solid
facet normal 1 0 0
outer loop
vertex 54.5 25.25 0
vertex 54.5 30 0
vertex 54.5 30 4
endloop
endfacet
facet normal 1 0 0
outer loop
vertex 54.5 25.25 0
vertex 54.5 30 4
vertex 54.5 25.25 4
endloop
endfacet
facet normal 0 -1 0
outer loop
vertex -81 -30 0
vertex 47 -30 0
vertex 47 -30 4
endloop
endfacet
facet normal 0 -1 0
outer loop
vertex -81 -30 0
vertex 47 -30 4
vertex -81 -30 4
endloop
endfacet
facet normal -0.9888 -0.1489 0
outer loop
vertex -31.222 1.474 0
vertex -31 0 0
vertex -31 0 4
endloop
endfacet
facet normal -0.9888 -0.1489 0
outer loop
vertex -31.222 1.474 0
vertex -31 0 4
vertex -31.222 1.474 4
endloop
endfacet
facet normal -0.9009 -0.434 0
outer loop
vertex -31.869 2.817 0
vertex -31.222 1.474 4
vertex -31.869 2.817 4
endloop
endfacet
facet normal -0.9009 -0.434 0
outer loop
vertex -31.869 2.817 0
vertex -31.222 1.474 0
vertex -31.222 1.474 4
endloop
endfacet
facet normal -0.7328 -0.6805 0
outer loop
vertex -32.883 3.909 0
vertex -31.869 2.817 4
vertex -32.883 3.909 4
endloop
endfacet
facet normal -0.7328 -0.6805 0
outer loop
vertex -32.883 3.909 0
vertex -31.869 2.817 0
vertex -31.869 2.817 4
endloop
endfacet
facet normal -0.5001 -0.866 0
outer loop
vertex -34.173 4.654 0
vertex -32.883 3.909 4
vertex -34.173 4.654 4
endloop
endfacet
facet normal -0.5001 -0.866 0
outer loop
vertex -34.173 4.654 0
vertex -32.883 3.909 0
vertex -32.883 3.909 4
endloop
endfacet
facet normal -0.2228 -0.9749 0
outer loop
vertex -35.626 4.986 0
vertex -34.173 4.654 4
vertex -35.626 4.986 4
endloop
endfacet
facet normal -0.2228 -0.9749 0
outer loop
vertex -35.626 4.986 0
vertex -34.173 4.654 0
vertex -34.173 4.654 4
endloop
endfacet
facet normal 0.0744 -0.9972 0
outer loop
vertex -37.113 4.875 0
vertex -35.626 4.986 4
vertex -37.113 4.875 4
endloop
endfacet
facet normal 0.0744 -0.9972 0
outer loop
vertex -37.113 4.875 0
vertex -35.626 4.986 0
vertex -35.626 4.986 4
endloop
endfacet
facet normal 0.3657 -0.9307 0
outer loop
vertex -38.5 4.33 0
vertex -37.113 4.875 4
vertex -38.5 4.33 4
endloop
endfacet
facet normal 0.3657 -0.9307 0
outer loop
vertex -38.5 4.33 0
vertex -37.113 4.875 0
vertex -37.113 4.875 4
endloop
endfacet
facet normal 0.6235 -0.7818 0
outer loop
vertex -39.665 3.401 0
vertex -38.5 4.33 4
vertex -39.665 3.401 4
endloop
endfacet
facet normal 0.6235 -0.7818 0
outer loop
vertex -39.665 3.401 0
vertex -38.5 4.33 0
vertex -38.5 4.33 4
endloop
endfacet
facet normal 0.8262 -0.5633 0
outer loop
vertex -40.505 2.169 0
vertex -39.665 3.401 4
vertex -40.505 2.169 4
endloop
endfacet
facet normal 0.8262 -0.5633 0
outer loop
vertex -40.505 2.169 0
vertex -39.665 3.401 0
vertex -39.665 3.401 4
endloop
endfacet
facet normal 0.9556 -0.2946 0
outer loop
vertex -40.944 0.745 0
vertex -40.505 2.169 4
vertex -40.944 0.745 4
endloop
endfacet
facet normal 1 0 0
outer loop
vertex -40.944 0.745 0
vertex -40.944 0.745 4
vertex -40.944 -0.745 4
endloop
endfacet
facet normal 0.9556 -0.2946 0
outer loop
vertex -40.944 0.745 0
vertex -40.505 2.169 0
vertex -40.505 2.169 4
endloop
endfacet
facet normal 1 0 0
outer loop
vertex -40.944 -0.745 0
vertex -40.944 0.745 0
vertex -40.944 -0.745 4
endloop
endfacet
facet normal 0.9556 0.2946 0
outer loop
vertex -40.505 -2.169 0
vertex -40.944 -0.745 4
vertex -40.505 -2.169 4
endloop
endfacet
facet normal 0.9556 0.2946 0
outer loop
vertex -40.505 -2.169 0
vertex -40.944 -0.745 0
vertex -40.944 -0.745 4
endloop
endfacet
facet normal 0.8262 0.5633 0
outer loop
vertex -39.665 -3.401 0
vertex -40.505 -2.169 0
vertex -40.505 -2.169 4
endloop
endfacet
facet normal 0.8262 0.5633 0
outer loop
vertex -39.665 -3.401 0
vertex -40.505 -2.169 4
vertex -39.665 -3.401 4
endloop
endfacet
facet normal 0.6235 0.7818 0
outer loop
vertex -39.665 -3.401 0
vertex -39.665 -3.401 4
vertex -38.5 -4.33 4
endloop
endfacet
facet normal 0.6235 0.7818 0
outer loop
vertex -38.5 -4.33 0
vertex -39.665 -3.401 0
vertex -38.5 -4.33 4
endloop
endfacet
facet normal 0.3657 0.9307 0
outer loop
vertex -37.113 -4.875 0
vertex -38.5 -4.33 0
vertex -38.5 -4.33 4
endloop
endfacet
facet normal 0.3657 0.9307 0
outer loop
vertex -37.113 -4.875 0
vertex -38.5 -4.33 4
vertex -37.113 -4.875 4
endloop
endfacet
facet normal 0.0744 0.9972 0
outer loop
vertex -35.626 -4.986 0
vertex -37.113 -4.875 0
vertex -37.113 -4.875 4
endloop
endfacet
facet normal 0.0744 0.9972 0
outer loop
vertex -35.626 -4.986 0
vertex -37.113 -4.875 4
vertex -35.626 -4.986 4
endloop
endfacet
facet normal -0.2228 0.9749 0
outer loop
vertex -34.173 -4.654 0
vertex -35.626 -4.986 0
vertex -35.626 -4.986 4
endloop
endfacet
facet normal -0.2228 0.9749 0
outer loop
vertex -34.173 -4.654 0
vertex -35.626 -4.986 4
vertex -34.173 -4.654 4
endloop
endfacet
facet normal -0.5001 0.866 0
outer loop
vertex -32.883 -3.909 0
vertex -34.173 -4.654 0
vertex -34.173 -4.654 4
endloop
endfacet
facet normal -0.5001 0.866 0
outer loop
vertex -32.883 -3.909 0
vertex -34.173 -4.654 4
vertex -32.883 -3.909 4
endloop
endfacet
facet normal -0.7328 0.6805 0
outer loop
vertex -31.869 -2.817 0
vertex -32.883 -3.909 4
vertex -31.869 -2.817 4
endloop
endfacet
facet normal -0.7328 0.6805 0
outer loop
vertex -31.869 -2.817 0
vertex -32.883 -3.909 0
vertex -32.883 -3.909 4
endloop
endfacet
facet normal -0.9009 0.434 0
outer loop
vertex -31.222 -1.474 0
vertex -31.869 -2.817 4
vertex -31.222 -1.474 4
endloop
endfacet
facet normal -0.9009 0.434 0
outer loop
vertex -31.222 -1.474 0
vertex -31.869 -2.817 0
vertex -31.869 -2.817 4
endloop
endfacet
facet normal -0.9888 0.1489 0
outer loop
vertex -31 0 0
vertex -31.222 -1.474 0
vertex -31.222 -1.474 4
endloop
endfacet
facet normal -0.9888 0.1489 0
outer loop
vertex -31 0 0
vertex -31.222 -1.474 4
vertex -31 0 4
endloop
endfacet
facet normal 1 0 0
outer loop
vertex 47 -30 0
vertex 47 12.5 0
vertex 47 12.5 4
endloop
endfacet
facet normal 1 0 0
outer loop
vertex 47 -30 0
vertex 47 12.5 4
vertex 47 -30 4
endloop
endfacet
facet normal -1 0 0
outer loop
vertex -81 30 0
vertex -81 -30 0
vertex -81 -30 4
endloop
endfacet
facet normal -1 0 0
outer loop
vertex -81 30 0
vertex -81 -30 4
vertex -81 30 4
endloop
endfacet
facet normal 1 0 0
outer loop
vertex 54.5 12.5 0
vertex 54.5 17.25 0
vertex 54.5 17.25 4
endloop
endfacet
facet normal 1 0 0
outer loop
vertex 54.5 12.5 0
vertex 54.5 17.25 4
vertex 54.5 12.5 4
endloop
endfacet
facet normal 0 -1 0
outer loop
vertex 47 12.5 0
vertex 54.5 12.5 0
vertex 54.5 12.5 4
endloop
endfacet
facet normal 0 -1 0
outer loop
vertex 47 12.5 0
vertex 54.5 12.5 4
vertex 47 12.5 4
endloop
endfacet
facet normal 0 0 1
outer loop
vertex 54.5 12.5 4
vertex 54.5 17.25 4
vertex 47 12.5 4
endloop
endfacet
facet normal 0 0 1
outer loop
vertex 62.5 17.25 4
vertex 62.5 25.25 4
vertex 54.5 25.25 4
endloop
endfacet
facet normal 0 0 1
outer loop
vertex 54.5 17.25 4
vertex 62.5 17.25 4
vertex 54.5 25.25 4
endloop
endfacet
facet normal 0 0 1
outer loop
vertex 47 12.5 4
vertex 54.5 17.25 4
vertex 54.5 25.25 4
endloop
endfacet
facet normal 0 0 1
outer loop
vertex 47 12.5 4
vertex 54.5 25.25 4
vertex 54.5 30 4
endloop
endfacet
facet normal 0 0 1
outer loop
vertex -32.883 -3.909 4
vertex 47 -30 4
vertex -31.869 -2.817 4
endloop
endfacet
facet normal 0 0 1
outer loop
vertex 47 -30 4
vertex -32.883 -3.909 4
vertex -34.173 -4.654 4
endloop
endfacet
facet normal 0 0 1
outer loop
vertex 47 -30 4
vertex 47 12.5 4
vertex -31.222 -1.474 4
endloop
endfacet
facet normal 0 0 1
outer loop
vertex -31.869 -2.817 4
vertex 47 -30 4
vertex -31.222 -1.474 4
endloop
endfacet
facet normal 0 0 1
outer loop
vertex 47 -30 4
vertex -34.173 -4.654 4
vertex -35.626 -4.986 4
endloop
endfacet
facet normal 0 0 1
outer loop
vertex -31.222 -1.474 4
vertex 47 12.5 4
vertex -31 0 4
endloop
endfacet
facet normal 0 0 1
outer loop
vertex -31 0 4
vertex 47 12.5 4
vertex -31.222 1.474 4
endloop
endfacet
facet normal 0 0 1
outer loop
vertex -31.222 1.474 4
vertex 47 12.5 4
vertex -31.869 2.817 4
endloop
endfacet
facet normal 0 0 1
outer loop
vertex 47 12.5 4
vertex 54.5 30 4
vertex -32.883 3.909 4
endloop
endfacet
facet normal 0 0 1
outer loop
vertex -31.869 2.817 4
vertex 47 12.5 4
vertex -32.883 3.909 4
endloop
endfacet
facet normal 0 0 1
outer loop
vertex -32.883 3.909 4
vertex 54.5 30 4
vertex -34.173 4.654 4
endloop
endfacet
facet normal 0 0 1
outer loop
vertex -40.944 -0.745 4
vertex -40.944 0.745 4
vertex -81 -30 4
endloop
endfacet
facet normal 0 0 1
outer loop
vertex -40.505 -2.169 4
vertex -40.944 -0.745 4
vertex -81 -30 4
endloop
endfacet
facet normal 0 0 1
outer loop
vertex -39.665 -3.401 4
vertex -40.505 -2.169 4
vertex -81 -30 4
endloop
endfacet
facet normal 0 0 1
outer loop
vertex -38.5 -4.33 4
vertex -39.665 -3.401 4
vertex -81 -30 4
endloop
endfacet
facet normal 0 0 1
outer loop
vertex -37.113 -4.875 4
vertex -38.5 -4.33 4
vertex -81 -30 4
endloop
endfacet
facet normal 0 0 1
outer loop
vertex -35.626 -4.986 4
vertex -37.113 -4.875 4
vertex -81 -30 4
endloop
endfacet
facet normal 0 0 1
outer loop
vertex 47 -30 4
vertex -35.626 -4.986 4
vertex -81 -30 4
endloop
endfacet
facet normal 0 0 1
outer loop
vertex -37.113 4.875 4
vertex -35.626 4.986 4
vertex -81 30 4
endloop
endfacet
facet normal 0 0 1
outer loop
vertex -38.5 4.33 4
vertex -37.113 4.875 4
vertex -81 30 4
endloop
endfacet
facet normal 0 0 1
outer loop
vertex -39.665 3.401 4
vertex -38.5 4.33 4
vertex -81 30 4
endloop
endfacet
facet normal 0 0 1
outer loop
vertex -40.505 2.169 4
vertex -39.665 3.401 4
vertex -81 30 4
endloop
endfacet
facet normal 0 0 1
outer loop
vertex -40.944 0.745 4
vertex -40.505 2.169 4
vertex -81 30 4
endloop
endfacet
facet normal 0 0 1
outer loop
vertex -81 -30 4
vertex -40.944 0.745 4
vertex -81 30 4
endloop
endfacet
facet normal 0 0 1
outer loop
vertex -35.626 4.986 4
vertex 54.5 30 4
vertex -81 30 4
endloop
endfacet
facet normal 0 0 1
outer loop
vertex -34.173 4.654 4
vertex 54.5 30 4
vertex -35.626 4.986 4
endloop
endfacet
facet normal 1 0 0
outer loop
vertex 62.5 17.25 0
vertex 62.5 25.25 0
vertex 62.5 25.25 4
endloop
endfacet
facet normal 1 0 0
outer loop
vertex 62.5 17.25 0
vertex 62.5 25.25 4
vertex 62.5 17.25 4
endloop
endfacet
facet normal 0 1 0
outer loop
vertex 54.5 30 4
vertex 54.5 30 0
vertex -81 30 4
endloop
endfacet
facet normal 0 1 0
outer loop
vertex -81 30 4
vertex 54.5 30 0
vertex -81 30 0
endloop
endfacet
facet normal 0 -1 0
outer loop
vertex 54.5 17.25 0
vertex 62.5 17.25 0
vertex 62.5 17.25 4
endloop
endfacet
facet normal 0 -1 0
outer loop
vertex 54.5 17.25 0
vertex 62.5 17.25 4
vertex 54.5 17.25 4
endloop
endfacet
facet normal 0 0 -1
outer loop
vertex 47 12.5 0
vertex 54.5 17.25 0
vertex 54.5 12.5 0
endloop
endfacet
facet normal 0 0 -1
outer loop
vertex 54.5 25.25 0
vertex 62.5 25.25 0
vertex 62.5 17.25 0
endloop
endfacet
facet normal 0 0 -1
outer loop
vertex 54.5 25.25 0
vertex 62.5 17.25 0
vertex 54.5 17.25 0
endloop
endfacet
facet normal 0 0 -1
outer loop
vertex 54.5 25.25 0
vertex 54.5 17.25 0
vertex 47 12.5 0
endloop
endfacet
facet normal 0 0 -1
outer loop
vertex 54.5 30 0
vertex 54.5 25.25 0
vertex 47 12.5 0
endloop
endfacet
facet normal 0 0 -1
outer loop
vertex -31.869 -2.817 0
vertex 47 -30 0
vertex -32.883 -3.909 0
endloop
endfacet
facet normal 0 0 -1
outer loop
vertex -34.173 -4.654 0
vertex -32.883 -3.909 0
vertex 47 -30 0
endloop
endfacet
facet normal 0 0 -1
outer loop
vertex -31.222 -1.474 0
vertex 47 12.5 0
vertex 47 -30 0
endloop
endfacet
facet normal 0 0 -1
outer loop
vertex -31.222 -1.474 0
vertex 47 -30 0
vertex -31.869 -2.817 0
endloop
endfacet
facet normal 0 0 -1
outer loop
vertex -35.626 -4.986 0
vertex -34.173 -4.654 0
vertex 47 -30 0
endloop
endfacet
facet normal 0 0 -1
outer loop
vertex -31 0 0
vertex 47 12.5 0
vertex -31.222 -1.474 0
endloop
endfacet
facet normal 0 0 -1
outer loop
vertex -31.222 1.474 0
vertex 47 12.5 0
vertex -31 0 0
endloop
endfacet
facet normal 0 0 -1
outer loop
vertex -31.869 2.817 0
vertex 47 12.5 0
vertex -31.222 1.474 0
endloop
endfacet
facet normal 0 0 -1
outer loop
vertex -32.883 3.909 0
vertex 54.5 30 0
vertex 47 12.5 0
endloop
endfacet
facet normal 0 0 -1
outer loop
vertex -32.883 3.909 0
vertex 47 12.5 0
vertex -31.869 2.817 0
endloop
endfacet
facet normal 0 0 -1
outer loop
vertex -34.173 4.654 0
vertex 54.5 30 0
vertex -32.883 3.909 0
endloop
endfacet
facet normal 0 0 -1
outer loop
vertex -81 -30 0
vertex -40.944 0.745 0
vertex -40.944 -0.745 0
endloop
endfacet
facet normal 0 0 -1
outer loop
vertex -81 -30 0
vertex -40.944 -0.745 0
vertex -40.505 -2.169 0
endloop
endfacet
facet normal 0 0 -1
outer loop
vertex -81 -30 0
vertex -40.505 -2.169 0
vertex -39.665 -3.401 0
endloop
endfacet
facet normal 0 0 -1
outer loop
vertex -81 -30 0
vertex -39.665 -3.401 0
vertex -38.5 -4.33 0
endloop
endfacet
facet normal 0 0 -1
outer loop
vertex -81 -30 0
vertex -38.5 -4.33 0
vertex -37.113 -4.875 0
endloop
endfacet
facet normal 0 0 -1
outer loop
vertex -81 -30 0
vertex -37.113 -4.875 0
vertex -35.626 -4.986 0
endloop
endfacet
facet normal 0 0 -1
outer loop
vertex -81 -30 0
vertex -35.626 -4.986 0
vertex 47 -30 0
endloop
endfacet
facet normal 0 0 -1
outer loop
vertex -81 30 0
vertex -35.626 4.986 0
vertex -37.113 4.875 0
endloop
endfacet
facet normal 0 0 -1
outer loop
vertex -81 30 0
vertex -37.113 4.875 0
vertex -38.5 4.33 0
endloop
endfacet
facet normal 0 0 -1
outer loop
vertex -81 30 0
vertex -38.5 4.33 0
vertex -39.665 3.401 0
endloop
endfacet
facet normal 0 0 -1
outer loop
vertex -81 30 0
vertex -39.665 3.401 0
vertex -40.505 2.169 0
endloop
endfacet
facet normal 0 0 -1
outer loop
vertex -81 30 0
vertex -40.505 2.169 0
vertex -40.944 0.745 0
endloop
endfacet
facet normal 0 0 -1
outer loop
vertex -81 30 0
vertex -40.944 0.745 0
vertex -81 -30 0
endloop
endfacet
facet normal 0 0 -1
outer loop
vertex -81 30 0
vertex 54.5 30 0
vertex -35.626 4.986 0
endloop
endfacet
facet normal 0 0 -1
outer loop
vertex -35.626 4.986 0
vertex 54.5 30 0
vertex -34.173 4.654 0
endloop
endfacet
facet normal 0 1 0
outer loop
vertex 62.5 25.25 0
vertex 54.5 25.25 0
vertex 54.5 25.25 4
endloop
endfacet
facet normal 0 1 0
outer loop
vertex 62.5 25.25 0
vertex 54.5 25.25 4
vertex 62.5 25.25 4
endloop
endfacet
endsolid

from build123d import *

# Parameters (mm, degrees)
SKETCH1_R           = 5
BOSS_EXTRUDE1_DEPTH = 4


with BuildPart() as part:
    # Sketch1 → Boss-Extrude1 (new body)
    with BuildSketch(Plane.XY):
        Polygon((47, 30), (54.5, 30), (54.5, 25.25), (62.5, 25.25), (62.5, 17.25), (54.5, 17.25), (54.5, 12.5), (47, 12.5), (47, -30), (-81, -30), (-81, 30), align=None)
        with Locations((-36, 0)):
            Circle(SKETCH1_R, mode=Mode.SUBTRACT)
    extrude(amount=BOSS_EXTRUDE1_DEPTH)


solid = part.part
